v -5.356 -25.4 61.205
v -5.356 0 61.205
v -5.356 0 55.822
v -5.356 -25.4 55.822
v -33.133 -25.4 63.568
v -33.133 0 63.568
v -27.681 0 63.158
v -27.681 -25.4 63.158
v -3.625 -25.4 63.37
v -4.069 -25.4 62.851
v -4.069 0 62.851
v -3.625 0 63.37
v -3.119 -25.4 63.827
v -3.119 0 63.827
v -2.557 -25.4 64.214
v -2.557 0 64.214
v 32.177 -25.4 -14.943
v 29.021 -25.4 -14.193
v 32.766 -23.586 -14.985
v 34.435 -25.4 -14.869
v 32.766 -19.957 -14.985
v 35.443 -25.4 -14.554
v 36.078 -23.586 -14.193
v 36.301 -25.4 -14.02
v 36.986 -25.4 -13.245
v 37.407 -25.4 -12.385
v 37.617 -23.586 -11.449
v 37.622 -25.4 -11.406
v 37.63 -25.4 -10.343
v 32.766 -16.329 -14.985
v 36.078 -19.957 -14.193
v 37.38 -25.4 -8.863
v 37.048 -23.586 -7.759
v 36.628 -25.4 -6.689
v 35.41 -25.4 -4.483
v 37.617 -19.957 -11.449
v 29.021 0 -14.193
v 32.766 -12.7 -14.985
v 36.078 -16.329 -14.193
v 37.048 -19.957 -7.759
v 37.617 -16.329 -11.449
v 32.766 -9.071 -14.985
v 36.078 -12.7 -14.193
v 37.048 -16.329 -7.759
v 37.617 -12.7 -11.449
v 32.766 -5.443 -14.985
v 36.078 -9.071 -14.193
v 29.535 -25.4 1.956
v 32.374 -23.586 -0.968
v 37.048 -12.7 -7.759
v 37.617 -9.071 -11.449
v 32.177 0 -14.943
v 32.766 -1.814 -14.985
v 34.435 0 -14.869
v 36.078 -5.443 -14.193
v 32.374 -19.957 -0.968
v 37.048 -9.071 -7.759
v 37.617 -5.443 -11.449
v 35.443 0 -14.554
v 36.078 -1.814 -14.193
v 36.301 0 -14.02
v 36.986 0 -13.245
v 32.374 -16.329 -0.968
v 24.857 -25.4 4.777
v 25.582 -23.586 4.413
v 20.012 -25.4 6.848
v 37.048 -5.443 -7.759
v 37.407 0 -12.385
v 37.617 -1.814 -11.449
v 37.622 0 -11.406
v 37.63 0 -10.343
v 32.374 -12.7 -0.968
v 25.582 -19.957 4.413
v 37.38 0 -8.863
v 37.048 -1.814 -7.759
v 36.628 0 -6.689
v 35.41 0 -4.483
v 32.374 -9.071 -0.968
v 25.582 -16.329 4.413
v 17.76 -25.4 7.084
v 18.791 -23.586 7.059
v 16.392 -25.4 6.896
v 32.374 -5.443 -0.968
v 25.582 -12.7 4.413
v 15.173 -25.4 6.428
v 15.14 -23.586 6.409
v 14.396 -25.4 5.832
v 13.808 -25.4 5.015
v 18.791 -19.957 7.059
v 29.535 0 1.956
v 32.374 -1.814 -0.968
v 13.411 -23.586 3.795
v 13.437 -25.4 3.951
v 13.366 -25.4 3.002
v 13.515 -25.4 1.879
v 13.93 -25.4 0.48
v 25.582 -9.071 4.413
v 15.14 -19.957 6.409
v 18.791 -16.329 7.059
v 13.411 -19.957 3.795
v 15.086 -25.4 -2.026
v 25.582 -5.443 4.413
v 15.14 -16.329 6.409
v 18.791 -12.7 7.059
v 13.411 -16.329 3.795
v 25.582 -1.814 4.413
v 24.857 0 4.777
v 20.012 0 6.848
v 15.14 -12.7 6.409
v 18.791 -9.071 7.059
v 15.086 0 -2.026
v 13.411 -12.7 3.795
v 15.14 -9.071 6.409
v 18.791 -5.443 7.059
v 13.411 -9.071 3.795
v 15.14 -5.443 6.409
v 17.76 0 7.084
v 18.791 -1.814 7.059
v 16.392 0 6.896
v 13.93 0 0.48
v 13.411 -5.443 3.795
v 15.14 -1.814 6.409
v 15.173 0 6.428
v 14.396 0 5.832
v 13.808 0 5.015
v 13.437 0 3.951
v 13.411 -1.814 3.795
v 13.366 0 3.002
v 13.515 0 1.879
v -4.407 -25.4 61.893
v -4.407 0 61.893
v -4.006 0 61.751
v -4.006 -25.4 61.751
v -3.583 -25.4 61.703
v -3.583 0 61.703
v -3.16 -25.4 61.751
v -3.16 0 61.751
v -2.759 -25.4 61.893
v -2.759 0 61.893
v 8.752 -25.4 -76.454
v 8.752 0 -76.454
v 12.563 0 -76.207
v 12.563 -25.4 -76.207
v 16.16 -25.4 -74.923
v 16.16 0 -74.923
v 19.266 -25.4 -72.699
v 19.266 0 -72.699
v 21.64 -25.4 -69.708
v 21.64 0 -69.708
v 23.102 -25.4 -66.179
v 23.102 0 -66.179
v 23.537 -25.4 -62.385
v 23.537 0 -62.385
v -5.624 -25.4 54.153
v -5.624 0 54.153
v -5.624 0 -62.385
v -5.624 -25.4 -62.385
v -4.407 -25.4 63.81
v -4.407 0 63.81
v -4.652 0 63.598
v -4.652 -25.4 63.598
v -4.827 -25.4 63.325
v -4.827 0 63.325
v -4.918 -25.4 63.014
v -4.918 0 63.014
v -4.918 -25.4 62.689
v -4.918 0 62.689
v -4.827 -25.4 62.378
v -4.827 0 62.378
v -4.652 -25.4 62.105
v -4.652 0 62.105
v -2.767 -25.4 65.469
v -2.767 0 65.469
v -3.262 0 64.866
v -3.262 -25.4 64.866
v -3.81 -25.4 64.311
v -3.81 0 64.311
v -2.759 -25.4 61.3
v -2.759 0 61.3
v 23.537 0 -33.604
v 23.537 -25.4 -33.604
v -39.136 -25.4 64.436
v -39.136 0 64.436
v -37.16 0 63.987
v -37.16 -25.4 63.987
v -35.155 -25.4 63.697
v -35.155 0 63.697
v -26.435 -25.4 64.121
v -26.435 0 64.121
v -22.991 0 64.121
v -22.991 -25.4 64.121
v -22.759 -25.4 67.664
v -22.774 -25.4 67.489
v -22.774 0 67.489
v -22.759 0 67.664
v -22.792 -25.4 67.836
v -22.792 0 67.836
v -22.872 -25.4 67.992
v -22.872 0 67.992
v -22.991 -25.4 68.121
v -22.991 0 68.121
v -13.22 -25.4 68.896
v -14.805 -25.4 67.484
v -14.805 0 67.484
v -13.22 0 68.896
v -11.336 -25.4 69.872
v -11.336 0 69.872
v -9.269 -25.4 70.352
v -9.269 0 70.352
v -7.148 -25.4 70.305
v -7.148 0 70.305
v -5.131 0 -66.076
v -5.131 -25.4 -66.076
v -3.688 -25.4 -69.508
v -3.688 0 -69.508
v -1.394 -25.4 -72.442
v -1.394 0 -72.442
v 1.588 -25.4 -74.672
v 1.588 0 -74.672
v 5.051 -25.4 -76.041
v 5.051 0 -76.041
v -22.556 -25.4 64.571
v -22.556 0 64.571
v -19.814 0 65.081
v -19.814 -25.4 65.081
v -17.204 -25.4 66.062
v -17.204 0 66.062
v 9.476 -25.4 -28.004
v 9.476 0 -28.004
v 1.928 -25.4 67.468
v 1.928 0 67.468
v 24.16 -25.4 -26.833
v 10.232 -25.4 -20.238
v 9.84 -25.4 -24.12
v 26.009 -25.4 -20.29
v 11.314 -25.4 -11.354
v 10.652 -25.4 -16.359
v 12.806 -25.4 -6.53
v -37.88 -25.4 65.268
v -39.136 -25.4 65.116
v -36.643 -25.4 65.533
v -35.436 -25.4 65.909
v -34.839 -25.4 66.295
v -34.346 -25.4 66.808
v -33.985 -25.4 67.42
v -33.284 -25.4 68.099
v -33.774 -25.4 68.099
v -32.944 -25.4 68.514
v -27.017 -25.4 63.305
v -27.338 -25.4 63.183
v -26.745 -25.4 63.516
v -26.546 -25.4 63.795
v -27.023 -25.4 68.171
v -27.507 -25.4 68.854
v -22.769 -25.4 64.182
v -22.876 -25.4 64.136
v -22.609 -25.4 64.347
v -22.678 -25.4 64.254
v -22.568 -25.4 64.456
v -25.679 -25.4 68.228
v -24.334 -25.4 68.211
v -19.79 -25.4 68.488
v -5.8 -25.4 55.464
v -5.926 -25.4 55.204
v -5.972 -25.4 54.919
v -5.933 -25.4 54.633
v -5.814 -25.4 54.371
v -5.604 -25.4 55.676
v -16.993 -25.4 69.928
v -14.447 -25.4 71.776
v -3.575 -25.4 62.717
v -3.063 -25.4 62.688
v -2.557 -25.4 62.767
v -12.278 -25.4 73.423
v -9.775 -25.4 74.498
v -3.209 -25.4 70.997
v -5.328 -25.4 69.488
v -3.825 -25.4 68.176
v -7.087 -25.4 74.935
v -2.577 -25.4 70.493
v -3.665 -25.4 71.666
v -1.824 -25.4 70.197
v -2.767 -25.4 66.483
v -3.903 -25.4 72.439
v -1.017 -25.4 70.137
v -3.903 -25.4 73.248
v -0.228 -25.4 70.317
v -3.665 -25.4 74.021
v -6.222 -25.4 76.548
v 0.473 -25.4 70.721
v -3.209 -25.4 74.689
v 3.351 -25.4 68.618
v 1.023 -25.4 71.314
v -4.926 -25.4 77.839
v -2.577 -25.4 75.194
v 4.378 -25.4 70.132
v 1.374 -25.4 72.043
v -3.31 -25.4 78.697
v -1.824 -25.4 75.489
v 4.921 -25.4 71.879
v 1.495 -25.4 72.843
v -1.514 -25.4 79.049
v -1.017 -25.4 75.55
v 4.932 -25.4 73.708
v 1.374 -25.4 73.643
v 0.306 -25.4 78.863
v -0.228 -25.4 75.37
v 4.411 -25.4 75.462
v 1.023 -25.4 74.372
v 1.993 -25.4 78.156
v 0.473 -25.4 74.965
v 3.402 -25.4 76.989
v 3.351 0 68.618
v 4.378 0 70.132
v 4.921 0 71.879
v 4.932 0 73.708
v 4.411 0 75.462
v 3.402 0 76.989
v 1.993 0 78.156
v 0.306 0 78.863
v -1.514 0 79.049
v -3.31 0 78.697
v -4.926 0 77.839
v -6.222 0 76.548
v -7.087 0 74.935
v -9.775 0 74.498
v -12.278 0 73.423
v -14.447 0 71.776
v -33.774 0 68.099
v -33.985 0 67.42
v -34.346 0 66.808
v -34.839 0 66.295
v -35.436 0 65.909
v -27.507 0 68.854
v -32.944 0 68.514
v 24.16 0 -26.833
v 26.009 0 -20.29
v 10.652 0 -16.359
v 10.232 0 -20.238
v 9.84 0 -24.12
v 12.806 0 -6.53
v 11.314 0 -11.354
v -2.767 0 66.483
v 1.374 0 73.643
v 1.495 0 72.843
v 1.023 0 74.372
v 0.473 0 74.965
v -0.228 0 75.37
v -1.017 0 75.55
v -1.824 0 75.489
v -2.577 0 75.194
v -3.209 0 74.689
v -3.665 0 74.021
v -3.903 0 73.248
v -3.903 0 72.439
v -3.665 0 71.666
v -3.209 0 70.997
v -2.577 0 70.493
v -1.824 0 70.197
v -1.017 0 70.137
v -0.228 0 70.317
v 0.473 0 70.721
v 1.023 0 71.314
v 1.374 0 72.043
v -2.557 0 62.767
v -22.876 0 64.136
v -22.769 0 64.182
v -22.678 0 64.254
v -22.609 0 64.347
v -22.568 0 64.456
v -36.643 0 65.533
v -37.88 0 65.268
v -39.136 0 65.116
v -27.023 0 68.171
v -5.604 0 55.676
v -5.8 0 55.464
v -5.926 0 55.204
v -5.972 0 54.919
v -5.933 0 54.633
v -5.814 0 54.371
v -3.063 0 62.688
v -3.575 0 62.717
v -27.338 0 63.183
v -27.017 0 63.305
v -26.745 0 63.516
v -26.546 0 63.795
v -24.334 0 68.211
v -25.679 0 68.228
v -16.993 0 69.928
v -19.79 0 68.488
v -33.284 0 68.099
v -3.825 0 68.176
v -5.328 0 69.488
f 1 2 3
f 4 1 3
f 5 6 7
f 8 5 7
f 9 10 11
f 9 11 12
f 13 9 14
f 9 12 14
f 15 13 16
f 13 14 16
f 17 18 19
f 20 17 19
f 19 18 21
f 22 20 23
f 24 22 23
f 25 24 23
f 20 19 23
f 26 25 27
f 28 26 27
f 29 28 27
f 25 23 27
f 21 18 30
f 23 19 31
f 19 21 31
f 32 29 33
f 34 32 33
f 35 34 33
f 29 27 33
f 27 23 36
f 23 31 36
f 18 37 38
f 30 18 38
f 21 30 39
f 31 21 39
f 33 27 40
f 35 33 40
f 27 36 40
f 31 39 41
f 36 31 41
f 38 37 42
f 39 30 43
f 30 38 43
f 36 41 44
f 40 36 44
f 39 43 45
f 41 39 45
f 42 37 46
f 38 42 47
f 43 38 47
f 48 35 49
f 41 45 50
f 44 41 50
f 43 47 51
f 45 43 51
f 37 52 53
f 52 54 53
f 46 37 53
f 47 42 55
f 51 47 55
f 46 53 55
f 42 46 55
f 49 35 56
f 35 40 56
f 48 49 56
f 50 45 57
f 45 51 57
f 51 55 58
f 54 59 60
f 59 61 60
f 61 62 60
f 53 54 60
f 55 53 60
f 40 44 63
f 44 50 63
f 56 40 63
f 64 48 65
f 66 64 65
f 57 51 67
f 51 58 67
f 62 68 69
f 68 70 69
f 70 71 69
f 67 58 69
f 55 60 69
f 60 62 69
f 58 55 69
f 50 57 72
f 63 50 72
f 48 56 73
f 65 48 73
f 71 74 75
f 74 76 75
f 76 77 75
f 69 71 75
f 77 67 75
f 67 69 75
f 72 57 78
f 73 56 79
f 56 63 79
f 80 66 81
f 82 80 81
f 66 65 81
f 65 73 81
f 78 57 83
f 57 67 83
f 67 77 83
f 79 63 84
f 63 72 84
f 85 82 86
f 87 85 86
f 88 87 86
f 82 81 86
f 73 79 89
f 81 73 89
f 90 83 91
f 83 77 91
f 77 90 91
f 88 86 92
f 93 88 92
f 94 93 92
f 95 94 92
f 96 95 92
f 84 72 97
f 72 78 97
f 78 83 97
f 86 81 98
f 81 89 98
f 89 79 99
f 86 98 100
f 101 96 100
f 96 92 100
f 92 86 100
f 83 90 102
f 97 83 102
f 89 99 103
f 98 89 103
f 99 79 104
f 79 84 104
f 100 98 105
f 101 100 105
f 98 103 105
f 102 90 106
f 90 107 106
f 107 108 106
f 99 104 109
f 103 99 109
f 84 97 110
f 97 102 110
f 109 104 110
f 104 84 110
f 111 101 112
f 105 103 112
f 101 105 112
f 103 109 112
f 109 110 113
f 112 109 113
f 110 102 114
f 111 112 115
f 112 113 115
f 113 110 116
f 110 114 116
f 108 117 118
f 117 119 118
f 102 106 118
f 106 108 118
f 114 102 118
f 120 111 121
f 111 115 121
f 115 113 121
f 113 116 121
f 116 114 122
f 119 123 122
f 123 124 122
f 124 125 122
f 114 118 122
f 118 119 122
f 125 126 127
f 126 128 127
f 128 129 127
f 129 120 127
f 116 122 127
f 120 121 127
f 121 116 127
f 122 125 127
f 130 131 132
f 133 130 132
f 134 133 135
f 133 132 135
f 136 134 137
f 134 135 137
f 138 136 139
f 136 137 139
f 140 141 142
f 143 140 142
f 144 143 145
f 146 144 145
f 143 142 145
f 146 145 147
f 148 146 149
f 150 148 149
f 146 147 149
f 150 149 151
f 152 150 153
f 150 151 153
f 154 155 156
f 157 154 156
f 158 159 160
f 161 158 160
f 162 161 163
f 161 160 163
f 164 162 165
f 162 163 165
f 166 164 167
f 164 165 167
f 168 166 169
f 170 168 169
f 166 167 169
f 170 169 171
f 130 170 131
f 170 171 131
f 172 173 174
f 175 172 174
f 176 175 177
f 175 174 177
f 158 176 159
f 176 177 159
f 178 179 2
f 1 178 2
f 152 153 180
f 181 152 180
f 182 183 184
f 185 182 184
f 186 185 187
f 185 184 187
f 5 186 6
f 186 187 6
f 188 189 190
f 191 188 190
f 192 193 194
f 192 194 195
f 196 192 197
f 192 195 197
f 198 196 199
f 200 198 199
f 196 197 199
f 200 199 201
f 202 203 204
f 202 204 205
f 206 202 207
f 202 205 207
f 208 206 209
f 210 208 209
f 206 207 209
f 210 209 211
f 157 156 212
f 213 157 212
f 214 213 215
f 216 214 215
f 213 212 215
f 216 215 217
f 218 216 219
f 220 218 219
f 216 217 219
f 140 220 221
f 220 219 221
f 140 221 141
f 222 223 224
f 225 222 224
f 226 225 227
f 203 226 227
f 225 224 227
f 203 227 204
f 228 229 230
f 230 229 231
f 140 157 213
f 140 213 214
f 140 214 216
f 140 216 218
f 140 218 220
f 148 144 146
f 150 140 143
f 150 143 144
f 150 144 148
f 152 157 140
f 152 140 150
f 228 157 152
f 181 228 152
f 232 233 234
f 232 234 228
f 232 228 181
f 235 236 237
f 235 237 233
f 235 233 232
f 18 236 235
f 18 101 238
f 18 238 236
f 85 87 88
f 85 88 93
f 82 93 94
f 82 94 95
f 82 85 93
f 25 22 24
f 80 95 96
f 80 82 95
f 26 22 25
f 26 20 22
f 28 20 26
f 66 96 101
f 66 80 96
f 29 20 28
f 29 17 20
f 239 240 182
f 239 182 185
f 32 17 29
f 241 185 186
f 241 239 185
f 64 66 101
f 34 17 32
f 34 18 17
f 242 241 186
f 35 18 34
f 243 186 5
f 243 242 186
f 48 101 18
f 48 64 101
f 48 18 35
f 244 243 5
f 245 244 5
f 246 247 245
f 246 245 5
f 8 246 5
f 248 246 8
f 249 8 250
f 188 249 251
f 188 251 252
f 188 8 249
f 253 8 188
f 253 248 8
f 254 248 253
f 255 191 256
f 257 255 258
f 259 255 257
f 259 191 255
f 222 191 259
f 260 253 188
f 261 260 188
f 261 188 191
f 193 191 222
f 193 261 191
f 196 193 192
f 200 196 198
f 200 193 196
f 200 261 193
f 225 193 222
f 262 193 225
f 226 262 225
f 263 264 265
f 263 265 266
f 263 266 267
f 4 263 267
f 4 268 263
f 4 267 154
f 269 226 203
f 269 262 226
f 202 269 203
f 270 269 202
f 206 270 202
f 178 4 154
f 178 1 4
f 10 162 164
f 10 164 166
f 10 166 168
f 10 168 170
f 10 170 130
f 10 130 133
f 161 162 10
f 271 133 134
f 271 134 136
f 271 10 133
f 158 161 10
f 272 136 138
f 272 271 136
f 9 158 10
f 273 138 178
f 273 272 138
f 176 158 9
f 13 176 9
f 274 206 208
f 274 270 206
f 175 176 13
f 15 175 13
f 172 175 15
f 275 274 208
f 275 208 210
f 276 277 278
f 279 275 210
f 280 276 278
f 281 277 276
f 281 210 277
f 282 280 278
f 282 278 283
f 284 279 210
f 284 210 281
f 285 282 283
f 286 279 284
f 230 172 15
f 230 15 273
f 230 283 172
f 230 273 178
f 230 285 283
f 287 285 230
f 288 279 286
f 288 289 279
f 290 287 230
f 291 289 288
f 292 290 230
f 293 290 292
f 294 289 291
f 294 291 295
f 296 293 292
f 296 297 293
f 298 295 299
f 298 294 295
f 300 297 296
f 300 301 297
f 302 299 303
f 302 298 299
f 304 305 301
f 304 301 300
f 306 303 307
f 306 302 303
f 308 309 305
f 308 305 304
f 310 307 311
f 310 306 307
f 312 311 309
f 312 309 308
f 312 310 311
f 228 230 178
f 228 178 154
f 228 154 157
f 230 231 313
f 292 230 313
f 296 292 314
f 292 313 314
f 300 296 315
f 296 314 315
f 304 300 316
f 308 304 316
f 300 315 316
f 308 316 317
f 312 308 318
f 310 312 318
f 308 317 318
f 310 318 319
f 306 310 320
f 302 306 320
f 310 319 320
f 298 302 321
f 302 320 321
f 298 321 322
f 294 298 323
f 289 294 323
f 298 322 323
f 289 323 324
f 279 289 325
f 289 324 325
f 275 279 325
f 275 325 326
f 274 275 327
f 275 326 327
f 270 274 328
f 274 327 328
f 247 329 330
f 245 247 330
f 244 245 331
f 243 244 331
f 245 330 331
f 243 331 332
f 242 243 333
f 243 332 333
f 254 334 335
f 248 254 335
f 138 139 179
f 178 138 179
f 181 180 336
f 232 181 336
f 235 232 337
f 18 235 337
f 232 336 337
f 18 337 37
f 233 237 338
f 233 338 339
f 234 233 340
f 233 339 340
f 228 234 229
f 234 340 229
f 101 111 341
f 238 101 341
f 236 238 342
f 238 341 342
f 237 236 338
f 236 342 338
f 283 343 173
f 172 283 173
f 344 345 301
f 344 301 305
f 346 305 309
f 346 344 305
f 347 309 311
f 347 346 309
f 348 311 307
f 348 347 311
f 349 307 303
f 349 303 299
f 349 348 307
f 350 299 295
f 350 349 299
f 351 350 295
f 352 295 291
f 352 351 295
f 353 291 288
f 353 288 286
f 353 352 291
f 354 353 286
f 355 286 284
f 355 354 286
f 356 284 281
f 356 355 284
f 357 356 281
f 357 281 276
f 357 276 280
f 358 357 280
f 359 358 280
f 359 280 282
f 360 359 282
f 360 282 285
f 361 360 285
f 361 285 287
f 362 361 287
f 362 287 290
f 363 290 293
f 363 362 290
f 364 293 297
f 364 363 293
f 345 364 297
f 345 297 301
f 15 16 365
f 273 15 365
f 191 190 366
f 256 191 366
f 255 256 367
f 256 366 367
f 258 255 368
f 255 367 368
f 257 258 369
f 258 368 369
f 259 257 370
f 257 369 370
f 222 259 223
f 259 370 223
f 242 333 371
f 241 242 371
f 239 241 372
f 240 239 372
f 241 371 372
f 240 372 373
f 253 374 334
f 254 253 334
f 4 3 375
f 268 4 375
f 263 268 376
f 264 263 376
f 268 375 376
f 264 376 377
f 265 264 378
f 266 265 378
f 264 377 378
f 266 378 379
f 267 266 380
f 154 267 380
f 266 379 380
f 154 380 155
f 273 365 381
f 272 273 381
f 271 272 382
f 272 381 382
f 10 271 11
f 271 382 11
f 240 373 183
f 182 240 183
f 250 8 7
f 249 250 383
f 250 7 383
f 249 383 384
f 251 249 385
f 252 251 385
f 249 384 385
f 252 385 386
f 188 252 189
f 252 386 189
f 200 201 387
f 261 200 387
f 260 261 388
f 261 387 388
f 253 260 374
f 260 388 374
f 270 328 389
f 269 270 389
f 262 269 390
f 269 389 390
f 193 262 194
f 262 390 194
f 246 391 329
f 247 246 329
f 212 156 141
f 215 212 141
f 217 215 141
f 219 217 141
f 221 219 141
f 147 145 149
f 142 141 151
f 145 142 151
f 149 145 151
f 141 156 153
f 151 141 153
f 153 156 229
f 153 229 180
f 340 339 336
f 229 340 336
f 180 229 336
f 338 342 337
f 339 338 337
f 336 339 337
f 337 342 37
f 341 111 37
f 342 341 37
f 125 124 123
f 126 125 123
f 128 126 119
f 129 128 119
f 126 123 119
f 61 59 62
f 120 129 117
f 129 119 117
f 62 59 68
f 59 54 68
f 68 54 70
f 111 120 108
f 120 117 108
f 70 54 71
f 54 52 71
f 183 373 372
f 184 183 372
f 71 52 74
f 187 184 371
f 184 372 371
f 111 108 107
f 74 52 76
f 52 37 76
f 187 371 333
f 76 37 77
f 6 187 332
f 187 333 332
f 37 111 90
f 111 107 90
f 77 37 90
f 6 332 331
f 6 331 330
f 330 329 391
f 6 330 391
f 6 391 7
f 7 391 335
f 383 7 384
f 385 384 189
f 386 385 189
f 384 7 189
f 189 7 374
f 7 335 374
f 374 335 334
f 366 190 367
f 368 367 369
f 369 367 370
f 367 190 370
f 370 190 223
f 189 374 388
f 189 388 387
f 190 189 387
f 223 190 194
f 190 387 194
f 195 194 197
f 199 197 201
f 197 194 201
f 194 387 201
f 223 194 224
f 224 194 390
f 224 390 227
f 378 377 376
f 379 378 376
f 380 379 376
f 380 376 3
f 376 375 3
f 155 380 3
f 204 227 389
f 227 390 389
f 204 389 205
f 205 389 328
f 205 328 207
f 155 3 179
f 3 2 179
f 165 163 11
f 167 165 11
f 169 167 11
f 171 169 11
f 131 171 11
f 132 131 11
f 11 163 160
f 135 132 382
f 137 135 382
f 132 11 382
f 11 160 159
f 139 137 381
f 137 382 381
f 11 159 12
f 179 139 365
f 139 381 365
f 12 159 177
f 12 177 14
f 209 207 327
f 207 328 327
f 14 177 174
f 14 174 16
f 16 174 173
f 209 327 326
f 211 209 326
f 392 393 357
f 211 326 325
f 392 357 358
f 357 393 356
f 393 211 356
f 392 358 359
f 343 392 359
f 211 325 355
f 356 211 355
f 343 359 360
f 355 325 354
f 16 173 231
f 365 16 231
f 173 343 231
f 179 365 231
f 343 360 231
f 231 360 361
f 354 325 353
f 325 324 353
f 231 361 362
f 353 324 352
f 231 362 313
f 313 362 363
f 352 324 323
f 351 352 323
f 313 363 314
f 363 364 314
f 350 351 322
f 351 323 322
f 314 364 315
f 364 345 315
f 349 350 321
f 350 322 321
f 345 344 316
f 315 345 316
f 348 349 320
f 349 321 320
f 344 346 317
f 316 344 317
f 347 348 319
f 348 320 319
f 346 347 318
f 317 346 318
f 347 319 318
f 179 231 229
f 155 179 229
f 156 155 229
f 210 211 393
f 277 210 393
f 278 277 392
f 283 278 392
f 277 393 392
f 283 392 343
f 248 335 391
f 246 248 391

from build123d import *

# Parameters (mm, degrees)
F0_R     = 2.7141078585
F1_DEPTH = 25.4


with BuildPart() as f1:
    # F0 (on Front) → F1 (new body)
    with BuildSketch(Plane.XZ):
        with BuildLine():
            ThreePointArc((-22.7738153189, 67.4887448549), (-22.7921703196, 67.8358713447), (-22.9910891503, 68.1209415197))
            ThreePointArc((-22.9910891503, 68.1209415197), (-25.0060573108, 68.2286465166), (-27.023088187, 68.1713446975))
            Line((-27.023088187, 68.1713446975), (-27.5066569448, 68.85394454))
            Line((-27.5066569448, 68.85394454), (-32.9437144101, 68.5141310096))
            Line((-32.9437144101, 68.5141310096), (-33.2835279405, 68.0987983942))
            Line((-33.2835279405, 68.0987983942), (-33.7743721902, 68.0987983942))
            ThreePointArc((-33.7743721902, 68.0987983942), (-34.3462634703, 66.8075266369), (-35.4356952012, 65.9088715911))
            ThreePointArc((-35.4356952012, 65.9088715911), (-37.2587240978, 65.3860426312), (-39.1359142959, 65.1159659028))
            Line((-39.1359142959, 65.1159659028), (-39.1359142959, 64.4363388419))
            ThreePointArc((-39.1359142959, 64.4363388419), (-36.1603072833, 63.8217018821), (-33.1325009465, 63.5679215193))
            Line((-33.1325009465, 63.5679215193), (-27.6813488454, 63.1581544876))
            ThreePointArc((-27.6813488454, 63.1581544876), (-26.8735932667, 63.4004566777), (-26.4353584498, 64.1209632158))
            Line((-26.4353584498, 64.1209632158), (-22.9910891503, 64.1209632158))
            ThreePointArc((-22.9910891503, 64.1209632158), (-22.6781080436, 64.253804751), (-22.5562322885, 64.5712167025))
            ThreePointArc((-22.5562322885, 64.5712167025), (-18.4875924267, 65.5145236697), (-14.8047618568, 67.4844011664))
            ThreePointArc((-14.8047618568, 67.4844011664), (-11.3362719877, 69.8718364191), (-7.1479254402, 70.3054517508))
            ThreePointArc((-7.1479254402, 70.3054517508), (-4.5277788439, 68.887173808), (-2.767395461, 66.4834827185))
            Line((-2.767395461, 66.4834827185), (-2.767395461, 65.4689446092))
            ThreePointArc((-2.767395461, 65.4689446092), (-3.5294504922, 64.5823352603), (-4.4071897864, 63.8100802898))
            ThreePointArc((-4.4071897864, 63.8100802898), (-4.9300350312, 62.8514010459), (-4.4071897864, 61.892721802))
            ThreePointArc((-4.4071897864, 61.892721802), (-3.5830599954, 61.7025134414), (-2.7589302044, 61.892721802))
            Line((-2.7589302044, 61.892721802), (-2.7589302044, 61.2999945879))
            Line((-2.7589302044, 61.2999945879), (-5.3555453196, 61.2048506737))
            Line((-5.3555453196, 61.2048506737), (-5.3555453196, 55.8223612607))
            ThreePointArc((-5.3555453196, 55.8223612607), (-5.9594502353, 55.0634497993), (-5.6238677353, 54.1534870863))
            Line((-5.6238677353, 54.1534870863), (-5.6238677353, -62.3845234513))
            ThreePointArc((-5.6238677353, -62.3845234513), (-1.3942884576, -72.4420651841), (8.752037771, -76.4539912343))
            ThreePointArc((8.752037771, -76.4539912343), (19.2657252949, -72.6993263655), (23.5365536064, -62.3845234513))
            Line((23.5365536064, -62.3845234513), (23.5365536064, -33.6043648422))
            ThreePointArc((23.5365536064, -33.6043648422), (24.933910985, -23.5189061999), (29.0207061917, -14.1932861879))
            add(Edge.make_bspline(
                [(15.0863882154, -2.0259027369), (15.7751326223, -3.2505053697), (17.6936460501, -6.0170930074), (22.1426691232, -9.8903754066), (25.8443379941, -12.661596163), (27.8917323554, -13.7772074835), (29.0207061917, -14.1932861879)],
                knots=[0.7563963627, 0.7563963627, 0.7563963627, 0.7563963627, 0.8175150943, 0.8867084098, 0.9473596072, 1, 1, 1, 1], degree=3))
            ThreePointArc((15.0863882154, -2.0259027369), (11.9584402409, -8.9105003241), (10.6517327949, -16.3586046547))
            ThreePointArc((10.6517327949, -16.3586046547), (10.0329411481, -22.1782742655), (9.4761149958, -28.0041992664))
            Line((9.4761149958, -28.0041992664), (1.9279766129, 67.4677416682))
            ThreePointArc((1.9279766129, 67.4677416682), (2.7407517304, 77.6242133721), (-7.0869945921, 74.935361743))
            ThreePointArc((-7.0869945921, 74.935361743), (-11.0595166202, 74.0372345412), (-14.4465807825, 71.7755183578))
            ThreePointArc((-14.4465807825, 71.7755183578), (-18.3642549618, 69.1543770007), (-22.7738153189, 67.4887448549))
        make_face()
        with BuildLine():
            ThreePointArc((-4.0688263252, 62.8514010459), (-3.3795349876, 63.606439902), (-2.557102358, 64.2137378454))
            Line((-2.557102358, 64.2137378454), (-2.557102358, 62.7673044801))
            ThreePointArc((-2.557102358, 62.7673044801), (-3.3196654997, 62.688892419), (-4.0688263252, 62.8514010459))
        make_face(mode=Mode.SUBTRACT)
        with Locations((-1.2195954115, 72.8432503492)):
            Circle(F0_R, mode=Mode.SUBTRACT)
        with BuildLine():
            add(Edge.make_bspline(
                [(29.0207061917, -14.1932861879), (30.2406466138, -14.6428902567), (32.9345834701, -15.2660315276), (36.2950164372, -14.5598167886), (38.0289094793, -11.7249246551), (37.2229168354, -7.6270218622), (35.2595789438, -3.9096619981), (32.3422375337, -1.020258382), (29.2120266668, 2.6106692647), (25.6048078466, 4.3930678157), (22.336210848, 6.0562350188), (18.9164254173, 7.3992483014), (14.6205334195, 6.7650587121), (13.0669516392, 3.8166109603), (13.6816516209, 0.8811160705), (14.5097147517, -1.0005646945), (15.0863882154, -2.0259027369)],
                knots=[0, 0, 0, 0, 0.0568818701, 0.1073544142, 0.1553694094, 0.2119304349, 0.2697329624, 0.3271327508, 0.3886771292, 0.4451547567, 0.4990018162, 0.5532498973, 0.6095065881, 0.6575515351, 0.705222734, 0.7563963627, 0.7563963627, 0.7563963627, 0.7563963627], degree=3))
            add(Edge.make_bspline(
                [(15.0863882154, -2.0259027369), (15.7751326223, -3.2505053697), (17.6936460501, -6.0170930074), (22.1426691232, -9.8903754066), (25.8443379941, -12.661596163), (27.8917323554, -13.7772074835), (29.0207061917, -14.1932861879)],
                knots=[0.7563963627, 0.7563963627, 0.7563963627, 0.7563963627, 0.8175150943, 0.8867084098, 0.9473596072, 1, 1, 1, 1], degree=3))
        make_face()
    extrude(amount=F1_DEPTH)


solid = f1.part
